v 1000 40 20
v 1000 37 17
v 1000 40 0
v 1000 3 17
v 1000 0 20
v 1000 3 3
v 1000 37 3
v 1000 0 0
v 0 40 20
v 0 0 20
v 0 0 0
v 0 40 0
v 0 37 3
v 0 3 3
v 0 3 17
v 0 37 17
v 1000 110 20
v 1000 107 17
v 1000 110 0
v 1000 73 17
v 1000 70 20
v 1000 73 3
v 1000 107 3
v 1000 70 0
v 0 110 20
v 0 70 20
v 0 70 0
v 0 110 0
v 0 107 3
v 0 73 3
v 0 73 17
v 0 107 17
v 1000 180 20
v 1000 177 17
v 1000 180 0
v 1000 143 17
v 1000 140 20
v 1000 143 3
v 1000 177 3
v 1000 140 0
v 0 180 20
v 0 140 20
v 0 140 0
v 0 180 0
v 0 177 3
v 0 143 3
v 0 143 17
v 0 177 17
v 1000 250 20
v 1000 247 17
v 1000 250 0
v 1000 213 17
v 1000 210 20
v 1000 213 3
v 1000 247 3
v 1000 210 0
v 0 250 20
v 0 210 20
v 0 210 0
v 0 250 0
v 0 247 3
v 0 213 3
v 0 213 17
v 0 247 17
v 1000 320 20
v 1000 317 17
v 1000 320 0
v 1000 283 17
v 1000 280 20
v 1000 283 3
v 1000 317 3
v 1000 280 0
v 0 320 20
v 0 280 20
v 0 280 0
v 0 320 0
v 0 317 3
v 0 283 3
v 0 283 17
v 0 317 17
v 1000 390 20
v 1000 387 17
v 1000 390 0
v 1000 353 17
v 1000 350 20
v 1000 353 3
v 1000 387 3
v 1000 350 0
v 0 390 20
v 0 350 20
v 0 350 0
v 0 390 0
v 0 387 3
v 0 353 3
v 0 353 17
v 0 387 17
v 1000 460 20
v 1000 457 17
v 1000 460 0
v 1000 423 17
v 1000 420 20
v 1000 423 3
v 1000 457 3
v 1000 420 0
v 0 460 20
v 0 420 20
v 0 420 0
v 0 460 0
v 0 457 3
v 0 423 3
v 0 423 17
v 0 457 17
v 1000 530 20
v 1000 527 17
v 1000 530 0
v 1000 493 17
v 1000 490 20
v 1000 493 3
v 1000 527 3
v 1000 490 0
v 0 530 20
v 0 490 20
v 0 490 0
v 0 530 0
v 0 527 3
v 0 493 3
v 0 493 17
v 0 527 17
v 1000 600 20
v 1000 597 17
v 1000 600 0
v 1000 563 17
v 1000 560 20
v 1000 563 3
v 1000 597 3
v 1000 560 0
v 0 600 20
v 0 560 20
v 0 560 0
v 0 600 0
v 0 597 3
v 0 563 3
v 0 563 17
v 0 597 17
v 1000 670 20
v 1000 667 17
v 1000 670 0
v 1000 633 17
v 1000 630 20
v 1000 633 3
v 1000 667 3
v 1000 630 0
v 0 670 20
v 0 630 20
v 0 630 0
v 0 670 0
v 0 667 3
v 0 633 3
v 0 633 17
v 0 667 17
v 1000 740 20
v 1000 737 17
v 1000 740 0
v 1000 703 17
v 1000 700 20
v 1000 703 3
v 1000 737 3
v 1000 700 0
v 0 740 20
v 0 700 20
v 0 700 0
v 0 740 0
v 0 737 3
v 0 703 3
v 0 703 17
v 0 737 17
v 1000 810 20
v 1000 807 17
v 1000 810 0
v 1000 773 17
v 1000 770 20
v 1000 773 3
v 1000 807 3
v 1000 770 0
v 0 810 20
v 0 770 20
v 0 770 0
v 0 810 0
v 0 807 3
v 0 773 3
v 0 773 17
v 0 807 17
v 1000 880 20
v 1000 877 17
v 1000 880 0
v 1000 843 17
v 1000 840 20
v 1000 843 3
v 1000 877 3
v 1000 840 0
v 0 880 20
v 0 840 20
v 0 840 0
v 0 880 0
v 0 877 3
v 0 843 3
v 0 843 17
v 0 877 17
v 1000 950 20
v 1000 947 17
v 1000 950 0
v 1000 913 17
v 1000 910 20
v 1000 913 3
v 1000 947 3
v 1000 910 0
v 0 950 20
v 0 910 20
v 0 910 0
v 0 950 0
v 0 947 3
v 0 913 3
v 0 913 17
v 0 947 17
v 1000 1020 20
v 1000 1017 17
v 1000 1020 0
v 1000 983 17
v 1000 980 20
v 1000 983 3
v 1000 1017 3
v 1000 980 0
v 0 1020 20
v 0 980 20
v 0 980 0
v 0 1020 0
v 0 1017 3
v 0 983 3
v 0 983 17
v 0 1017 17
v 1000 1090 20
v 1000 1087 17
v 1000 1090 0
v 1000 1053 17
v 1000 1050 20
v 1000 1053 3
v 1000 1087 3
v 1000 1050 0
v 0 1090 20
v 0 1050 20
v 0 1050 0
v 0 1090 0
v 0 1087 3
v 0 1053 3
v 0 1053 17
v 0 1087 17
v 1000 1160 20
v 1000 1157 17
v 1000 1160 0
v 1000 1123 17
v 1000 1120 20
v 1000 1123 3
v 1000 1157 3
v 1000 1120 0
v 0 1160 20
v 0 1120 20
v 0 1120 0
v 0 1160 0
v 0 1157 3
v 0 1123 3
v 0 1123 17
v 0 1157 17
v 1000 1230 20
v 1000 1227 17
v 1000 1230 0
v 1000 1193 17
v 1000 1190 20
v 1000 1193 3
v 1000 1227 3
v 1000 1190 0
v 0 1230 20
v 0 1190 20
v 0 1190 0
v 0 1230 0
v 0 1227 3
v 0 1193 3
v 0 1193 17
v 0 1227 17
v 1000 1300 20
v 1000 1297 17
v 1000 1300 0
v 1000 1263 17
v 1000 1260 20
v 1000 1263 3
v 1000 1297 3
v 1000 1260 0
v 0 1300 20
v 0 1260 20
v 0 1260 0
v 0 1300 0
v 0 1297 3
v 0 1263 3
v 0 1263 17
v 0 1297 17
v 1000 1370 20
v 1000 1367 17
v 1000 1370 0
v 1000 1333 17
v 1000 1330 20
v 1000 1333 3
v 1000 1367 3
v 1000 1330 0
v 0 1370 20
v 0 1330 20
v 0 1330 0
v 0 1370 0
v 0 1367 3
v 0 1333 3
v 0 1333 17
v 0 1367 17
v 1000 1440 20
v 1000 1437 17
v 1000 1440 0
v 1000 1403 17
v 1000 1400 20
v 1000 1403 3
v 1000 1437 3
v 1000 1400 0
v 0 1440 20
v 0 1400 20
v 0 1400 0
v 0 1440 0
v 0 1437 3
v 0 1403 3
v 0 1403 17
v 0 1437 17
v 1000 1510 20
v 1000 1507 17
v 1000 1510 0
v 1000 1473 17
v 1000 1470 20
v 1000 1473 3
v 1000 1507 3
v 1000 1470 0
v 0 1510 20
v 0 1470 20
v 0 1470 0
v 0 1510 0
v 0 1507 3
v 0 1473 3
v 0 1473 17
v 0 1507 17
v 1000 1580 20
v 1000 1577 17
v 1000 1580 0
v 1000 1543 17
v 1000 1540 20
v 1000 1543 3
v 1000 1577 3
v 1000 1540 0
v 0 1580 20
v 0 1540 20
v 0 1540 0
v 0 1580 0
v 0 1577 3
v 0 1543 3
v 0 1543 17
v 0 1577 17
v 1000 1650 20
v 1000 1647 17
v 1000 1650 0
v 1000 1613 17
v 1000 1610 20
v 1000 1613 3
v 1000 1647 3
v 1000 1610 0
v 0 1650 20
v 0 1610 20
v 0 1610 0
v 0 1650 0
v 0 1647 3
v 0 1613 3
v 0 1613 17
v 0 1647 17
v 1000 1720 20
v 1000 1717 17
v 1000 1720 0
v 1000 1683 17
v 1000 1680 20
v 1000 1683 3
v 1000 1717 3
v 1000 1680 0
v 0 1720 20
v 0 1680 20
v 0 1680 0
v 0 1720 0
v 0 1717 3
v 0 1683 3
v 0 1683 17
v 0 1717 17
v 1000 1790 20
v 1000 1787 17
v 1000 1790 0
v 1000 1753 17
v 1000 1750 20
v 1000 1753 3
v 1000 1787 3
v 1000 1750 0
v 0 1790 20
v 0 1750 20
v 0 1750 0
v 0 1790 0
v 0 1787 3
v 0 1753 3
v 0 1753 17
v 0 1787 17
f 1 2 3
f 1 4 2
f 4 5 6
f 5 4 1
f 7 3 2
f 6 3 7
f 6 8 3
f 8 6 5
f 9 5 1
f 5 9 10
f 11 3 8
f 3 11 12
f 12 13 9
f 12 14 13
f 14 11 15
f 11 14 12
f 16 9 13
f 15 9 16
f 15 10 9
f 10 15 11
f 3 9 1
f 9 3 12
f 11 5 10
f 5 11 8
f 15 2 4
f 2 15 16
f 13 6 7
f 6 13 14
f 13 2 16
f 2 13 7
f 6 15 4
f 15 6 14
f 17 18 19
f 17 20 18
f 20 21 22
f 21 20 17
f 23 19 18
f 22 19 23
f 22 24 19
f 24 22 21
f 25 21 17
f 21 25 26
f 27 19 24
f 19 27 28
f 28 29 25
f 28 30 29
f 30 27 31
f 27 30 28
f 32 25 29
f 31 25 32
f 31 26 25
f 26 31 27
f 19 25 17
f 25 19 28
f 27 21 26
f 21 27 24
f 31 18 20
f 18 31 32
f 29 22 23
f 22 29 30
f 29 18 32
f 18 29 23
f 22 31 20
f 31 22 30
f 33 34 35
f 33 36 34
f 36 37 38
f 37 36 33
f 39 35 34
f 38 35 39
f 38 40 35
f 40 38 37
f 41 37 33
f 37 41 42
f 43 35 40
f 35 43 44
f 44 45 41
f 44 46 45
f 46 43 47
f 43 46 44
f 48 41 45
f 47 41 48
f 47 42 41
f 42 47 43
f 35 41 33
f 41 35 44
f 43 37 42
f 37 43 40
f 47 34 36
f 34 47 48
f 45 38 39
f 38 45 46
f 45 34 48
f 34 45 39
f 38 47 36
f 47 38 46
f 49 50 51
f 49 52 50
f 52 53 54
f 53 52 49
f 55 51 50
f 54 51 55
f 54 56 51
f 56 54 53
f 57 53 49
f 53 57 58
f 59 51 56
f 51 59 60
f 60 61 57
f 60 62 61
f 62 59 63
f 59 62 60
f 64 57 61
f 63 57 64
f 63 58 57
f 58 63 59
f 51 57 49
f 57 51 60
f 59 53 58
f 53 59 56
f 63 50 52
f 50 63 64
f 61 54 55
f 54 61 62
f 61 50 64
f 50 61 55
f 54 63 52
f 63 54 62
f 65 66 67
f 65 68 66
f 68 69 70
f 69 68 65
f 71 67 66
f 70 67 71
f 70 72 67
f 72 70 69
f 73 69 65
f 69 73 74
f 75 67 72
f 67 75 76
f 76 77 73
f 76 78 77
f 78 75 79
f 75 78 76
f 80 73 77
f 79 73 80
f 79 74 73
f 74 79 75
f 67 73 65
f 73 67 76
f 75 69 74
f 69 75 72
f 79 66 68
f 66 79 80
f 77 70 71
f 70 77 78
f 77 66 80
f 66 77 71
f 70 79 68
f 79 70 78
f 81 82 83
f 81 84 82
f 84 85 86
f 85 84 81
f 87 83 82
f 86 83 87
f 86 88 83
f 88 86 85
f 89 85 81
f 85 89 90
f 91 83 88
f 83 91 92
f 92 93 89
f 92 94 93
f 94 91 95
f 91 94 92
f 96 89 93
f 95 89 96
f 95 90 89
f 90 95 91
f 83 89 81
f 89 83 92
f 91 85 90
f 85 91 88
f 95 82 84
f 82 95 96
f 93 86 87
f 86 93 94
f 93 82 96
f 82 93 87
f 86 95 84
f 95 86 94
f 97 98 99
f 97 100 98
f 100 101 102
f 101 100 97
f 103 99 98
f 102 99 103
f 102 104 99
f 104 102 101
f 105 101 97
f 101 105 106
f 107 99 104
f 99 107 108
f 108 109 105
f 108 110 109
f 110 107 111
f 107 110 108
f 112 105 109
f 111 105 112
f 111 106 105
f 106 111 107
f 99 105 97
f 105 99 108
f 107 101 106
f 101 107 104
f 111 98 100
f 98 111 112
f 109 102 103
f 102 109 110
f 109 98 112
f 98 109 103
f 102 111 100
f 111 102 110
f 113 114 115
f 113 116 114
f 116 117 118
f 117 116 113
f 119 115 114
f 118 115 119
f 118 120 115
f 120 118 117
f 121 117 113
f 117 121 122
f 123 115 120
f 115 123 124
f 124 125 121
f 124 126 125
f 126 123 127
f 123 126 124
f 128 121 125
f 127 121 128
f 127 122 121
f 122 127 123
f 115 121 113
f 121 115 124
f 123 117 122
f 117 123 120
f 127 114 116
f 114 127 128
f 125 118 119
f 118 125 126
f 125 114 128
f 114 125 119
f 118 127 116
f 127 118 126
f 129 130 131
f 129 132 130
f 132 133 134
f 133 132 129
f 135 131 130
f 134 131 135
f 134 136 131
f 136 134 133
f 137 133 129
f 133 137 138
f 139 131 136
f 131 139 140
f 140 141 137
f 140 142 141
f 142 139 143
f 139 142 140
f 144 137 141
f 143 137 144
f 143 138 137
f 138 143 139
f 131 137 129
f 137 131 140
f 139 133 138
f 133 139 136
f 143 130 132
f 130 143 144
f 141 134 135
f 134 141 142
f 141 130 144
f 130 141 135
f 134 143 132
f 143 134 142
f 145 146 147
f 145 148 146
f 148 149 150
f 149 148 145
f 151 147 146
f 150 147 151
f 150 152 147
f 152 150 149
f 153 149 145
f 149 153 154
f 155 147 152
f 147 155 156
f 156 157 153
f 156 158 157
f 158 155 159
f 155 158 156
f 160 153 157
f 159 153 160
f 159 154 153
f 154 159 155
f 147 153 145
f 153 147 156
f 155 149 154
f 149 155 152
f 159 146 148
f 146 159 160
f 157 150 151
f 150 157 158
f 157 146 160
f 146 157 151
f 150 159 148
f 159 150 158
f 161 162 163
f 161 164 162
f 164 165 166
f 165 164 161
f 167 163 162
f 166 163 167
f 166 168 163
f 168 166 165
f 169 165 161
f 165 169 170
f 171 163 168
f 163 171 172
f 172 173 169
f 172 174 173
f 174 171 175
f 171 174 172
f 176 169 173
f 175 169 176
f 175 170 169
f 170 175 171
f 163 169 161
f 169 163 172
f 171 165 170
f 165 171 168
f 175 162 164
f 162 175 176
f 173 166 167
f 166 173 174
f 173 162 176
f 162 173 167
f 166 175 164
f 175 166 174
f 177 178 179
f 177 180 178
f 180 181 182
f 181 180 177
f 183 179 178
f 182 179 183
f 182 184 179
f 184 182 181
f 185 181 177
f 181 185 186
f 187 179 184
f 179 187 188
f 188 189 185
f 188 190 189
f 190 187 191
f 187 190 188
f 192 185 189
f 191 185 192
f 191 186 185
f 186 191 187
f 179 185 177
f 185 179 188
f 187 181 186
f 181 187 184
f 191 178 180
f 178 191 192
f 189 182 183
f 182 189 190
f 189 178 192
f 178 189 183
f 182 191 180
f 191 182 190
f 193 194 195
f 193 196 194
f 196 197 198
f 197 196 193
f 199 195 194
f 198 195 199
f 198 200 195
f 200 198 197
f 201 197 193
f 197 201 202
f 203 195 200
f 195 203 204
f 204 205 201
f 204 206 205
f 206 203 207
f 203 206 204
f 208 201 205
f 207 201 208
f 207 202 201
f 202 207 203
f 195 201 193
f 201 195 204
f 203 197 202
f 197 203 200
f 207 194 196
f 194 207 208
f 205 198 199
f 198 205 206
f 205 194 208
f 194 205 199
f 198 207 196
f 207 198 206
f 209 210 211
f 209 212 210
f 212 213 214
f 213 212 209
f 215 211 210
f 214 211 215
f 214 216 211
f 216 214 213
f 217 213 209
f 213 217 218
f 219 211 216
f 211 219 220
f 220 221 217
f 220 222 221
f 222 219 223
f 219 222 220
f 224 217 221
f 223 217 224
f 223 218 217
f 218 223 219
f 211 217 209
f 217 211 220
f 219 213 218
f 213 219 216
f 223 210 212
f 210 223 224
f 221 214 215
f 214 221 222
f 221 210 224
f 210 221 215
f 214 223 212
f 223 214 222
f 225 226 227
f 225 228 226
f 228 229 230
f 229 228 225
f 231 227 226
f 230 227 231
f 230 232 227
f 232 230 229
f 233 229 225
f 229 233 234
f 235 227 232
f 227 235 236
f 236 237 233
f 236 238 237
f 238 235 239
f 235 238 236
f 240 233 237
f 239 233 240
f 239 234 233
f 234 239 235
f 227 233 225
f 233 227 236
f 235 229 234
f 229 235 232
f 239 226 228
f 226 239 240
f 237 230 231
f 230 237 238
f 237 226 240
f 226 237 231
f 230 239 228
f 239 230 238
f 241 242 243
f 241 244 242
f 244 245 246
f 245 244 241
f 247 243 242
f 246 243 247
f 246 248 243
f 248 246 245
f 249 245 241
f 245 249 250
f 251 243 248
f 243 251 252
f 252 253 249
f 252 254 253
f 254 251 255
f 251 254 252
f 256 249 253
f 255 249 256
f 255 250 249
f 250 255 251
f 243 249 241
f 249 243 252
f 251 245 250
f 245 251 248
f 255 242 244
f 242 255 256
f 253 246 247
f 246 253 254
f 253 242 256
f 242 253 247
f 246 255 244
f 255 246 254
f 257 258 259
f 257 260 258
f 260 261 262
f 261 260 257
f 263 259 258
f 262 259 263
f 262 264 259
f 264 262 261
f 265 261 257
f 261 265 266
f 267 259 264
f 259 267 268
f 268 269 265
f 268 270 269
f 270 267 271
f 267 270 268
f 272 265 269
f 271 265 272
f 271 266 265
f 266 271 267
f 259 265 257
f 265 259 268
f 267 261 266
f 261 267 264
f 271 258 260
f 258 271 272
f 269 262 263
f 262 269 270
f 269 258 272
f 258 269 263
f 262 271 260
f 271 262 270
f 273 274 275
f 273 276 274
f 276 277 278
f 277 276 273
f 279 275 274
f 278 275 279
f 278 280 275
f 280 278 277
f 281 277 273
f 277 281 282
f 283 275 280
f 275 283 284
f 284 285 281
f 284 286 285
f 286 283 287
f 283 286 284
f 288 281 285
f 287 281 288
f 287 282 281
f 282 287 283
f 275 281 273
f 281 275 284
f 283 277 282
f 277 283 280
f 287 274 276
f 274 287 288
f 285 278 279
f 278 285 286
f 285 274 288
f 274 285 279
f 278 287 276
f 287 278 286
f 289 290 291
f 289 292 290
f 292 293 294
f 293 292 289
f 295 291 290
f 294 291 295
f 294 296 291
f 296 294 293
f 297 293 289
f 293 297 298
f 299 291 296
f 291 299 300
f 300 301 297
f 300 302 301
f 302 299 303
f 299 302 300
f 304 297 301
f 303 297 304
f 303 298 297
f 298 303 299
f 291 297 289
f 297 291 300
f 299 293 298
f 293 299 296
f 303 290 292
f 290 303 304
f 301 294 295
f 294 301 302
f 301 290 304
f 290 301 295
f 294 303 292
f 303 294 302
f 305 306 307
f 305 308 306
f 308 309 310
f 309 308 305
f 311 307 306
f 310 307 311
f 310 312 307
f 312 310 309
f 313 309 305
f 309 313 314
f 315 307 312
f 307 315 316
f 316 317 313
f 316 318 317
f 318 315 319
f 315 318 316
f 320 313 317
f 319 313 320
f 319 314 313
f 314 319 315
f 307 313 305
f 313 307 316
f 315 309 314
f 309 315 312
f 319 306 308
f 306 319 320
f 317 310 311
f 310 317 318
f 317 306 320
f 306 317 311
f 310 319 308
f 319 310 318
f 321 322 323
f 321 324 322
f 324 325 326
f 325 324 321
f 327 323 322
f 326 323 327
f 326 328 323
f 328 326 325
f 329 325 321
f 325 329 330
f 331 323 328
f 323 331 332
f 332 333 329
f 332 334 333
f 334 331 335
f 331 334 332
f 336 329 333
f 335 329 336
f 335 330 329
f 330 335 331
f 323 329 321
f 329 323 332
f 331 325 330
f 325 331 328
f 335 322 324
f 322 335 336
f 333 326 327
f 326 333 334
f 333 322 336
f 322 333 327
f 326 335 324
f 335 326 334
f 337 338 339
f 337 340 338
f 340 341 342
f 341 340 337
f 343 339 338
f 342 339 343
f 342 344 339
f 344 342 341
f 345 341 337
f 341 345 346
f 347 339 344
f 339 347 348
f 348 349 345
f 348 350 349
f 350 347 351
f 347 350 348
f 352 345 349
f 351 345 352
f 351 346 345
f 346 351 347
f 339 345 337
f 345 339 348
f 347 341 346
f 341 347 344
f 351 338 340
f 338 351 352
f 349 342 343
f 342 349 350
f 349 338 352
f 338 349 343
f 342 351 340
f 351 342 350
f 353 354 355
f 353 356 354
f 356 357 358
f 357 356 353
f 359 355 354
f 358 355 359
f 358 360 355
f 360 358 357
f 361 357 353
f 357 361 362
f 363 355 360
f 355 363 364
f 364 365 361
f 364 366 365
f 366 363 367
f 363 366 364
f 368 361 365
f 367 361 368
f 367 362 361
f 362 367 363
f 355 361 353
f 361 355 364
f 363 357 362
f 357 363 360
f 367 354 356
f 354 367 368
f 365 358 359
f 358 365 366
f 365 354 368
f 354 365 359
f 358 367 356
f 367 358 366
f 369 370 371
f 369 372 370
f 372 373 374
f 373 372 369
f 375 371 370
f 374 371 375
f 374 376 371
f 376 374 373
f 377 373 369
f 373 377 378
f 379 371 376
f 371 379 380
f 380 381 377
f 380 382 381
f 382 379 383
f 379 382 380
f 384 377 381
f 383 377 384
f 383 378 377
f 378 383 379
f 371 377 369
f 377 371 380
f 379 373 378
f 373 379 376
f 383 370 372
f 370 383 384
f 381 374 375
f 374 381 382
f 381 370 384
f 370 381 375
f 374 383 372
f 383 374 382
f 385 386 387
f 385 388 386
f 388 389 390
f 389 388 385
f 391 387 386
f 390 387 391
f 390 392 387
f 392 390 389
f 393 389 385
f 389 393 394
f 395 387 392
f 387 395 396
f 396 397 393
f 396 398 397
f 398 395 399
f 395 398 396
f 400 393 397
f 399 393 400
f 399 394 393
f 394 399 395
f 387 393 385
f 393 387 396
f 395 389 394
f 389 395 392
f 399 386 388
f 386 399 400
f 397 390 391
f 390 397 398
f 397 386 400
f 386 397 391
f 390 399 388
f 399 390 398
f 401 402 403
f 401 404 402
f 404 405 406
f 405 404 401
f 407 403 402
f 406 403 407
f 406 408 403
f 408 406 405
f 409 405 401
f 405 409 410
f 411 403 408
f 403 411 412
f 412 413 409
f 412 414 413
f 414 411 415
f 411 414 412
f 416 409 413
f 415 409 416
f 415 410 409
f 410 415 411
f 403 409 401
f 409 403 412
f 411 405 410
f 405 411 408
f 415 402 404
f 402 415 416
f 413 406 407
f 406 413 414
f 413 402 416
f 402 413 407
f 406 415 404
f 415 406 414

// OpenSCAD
$fn = 256;

module tube(outerWidth = 40, outerHeight = 20, thickness = 3, length = 1500) {

    difference() {
        cube([length, outerWidth, outerHeight]);
        
        translate([-5, thickness, thickness])
        cube([length + 10, outerWidth - thickness * 2, outerHeight - thickness * 2]);
    }
}



for (i=[0:25]) {
   translate([0,i*70,0])
     tube(length = 1000);
}

//tube();
